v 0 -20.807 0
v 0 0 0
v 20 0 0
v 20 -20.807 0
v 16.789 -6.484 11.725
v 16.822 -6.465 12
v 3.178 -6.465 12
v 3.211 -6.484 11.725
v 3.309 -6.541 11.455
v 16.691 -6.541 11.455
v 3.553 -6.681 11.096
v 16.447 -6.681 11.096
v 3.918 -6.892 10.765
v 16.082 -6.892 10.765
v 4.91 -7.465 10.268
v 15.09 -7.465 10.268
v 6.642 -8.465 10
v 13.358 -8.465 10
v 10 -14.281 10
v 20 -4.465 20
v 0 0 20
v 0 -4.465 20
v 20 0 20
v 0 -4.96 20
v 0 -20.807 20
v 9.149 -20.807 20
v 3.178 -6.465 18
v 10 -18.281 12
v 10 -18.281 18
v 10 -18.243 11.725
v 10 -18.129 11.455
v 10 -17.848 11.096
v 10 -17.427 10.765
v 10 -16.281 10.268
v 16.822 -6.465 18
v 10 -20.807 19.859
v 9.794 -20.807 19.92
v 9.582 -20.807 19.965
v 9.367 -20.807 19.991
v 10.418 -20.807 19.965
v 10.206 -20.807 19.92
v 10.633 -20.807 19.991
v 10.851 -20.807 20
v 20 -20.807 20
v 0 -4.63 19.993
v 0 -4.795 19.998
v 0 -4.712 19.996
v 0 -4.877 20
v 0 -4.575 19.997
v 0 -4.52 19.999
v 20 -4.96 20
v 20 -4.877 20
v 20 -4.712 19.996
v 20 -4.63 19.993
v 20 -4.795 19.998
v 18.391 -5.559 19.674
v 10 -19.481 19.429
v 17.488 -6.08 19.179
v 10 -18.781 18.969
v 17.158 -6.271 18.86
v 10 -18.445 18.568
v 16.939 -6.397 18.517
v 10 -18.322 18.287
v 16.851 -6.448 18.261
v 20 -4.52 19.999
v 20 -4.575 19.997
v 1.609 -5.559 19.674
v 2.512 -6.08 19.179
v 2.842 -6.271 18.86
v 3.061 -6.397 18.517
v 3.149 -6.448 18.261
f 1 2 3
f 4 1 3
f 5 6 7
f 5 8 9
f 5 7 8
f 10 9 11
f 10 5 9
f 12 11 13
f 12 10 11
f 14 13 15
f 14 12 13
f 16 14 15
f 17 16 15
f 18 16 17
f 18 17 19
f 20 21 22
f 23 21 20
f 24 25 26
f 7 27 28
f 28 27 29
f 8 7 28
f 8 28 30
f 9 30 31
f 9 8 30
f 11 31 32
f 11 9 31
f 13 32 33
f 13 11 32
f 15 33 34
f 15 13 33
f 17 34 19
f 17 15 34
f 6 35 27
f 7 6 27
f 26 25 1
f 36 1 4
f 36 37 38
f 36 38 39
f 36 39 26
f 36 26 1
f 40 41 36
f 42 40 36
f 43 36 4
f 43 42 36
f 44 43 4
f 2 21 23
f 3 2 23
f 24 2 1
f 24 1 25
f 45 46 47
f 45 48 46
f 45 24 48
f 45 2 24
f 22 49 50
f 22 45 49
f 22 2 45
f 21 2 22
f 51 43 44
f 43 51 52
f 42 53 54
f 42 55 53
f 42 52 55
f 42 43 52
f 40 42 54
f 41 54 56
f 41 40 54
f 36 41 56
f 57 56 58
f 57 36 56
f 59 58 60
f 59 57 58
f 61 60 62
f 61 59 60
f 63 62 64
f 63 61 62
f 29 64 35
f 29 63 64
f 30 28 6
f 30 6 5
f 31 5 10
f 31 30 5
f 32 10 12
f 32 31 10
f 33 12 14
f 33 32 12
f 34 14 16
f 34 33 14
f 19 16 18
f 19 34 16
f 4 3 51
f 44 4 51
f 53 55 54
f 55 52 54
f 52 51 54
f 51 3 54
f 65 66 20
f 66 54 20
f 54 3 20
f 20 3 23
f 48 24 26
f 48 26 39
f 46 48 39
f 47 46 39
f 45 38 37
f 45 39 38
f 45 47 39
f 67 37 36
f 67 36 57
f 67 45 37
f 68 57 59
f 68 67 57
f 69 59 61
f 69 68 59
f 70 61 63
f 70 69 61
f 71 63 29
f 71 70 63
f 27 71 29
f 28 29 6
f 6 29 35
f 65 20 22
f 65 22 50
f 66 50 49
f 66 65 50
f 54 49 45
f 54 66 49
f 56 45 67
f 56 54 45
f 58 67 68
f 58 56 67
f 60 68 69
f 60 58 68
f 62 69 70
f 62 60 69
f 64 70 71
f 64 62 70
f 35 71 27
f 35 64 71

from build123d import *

# Parameters (mm, degrees)
F0_W         = 20
F0_H         = 20
F1_DEPTH     = 20.8070650697
F3_DEPTH     = 10
F4_T4_DEPTH  = 23.6433897602
F4_T10_DEPTH = 23.6433897602
F4_T15_DEPTH = 23.6433897602
F4_T20_DEPTH = 23.6433897602
F4_T26_DEPTH = 23.6433897602
F4_T32_DEPTH = 23.6433897602
F4_T39_DEPTH = 23.6433897602
F4_T44_DEPTH = 23.6433897602
F4_T52_DEPTH = 23.6433897602
F4_T57_DEPTH = 23.6433897602
F4_T65_DEPTH = 23.6433897602
F4_T70_DEPTH = 23.6433897602


# Not quite as in the source:
# - a fillet or chamfer that OpenCascade refuses, or shapes differently, is made with other operations: its cross-section is extruded or revolved along the edge and cut away or added


with BuildPart() as f1:
    # F0 (on Front) → F1 (new body)
    with BuildSketch(Plane.XZ):
        with Locations((10, 10)):
            Rectangle(F0_W, F0_H)
    extrude(amount=F1_DEPTH)

    # F2 (on face) → F3 (cut)
    with BuildSketch(Plane.XY.offset(20)):
        Polygon((10, -18.2805472855), (16.8216948801, -6.4650251595), (3.1783051199, -6.4650251595), align=None)
    extrude(amount=-F3_DEPTH, mode=Mode.SUBTRACT)

    # F4: fillet of radius 2 on 6 edges, made by hand


with BuildPart() as f4_tool2:
    # F4_s3 → F4_t4 (new body)
    with BuildSketch(Plane.YZ.offset(21.8216948801)):
        with BuildLine():
            ThreePointArc((-6.4650251595, 12), (-7.0508115971, 10.5857864376), (-8.4650251595, 10))
            Line((-8.4650251595, 10), (-6.4650251595, 10))
            Line((-6.4650251595, 10), (-6.4650251595, 12))
        make_face()
    extrude(amount=-F4_T4_DEPTH)

    split(bisect_by=Plane(origin=(-0.4157091722, -0.2400098025, 0), x_dir=(0, 0, 1), z_dir=(0.8660254038, 0.5, 0)), keep=Keep.TOP)

    split(bisect_by=Plane(origin=(15.4157091722, -8.9002638403, 0), x_dir=(0, 0, 1), z_dir=(-0.8660254038, 0.5, 0)), keep=Keep.TOP)


with BuildPart() as f1_1:
    add(f1.part)

    # F4_t1: union F4_tool2
    add(f4_tool2.part)


with BuildPart() as f4_tool8:
    # F4_s9 → F4_t10 (new body)
    with BuildSketch(Plane(origin=(-7.9157091722, -13.7104104641, 0), x_dir=(0, 0, 1), z_dir=(0.5, 0.8660254038, 0))):
        with BuildLine():
            ThreePointArc((12, 17.8005276806), (10.5857864376, 17.214741243), (10, 15.8005276806))
            Line((10, 15.8005276806), (10, 17.8005276806))
            Line((10, 17.8005276806), (12, 17.8005276806))
        make_face()
    extrude(amount=F4_T10_DEPTH)

    split(bisect_by=Plane(origin=(-0.4157091722, -0.2400098025, 0), x_dir=(0, 0, 1), z_dir=(0.8660254038, 0.5, 0)), keep=Keep.TOP)


with BuildPart() as f1_2:
    add(f1_1.part)

    # F4_t7: union F4_tool8
    add(f4_tool8.part)


with BuildPart() as f4_tool13:
    # F4_s14 → F4_t15 (new body)
    with BuildSketch(Plane(origin=(1.0940142921, -1.8948883381, 0), x_dir=(0, 0, 1), z_dir=(0.5, -0.8660254038, 0))):
        with BuildLine():
            ThreePointArc((12, 0.4800196049), (10.5857864376, -0.1057668327), (10, -1.5199803951))
            Line((10, -1.5199803951), (10, 0.4800196049))
            Line((10, 0.4800196049), (12, 0.4800196049))
        make_face()
    extrude(amount=F4_T15_DEPTH)

    split(bisect_by=Plane(origin=(15.4157091722, -8.9002638403, 0), x_dir=(0, 0, 1), z_dir=(-0.8660254038, 0.5, 0)), keep=Keep.TOP)


with BuildPart() as f1_3:
    add(f1_2.part)

    # F4_t12: union F4_tool13
    add(f4_tool13.part)


with BuildPart() as f4_tool18:
    # F4_s19 → F4_t20 (new body)
    with BuildSketch(Plane(origin=(-7.9157091722, -13.7104104641, 0), x_dir=(0, 0, 1), z_dir=(0.5, 0.8660254038, 0))):
        with BuildLine():
            ThreePointArc((20, 19.8005276806), (19.4142135624, 18.3863141182), (18, 17.8005276806))
            Line((18, 17.8005276806), (20, 17.8005276806))
            Line((20, 17.8005276806), (20, 19.8005276806))
        make_face()
    extrude(amount=F4_T20_DEPTH)

    split(bisect_by=Plane(origin=(-0.4157091722, -0.2400098025, 0), x_dir=(0, 0, 1), z_dir=(0.8660254038, 0.5, 0)), keep=Keep.TOP)

    split(bisect_by=Plane.XZ.offset(6.4650251595), keep=Keep.TOP)


with BuildPart() as f1_4:
    add(f1_3.part)

    # F4_t17: cut F4_tool18
    add(f4_tool18.part, mode=Mode.SUBTRACT)


with BuildPart() as f4_tool24:
    # F4_s25 → F4_t26 (new body)
    with BuildSketch(Plane(origin=(1.0940142921, -1.8948883381, 0), x_dir=(0, 0, 1), z_dir=(0.5, -0.8660254038, 0))):
        with BuildLine():
            ThreePointArc((20, 2.4800196049), (19.4142135624, 1.0658060425), (18, 0.4800196049))
            Line((18, 0.4800196049), (20, 0.4800196049))
            Line((20, 0.4800196049), (20, 2.4800196049))
        make_face()
    extrude(amount=F4_T26_DEPTH)

    split(bisect_by=Plane.XZ.offset(6.4650251595), keep=Keep.TOP)

    split(bisect_by=Plane(origin=(15.4157091722, -8.9002638403, 0), x_dir=(0, 0, 1), z_dir=(-0.8660254038, 0.5, 0)), keep=Keep.TOP)


with BuildPart() as f1_5:
    add(f1_4.part)

    # F4_t23: cut F4_tool24
    add(f4_tool24.part, mode=Mode.SUBTRACT)


with BuildPart() as f4_tool30:
    # F4_s31 → F4_t32 (new body)
    with BuildSketch(Plane.YZ.offset(21.8216948801)):
        with BuildLine():
            ThreePointArc((-4.4650251595, 20), (-5.8792387219, 19.4142135624), (-6.4650251595, 18))
            Line((-6.4650251595, 18), (-6.4650251595, 20))
            Line((-6.4650251595, 20), (-4.4650251595, 20))
        make_face()
    extrude(amount=-F4_T32_DEPTH)

    split(bisect_by=Plane(origin=(-0.4157091722, -0.2400098025, 0), x_dir=(0, 0, 1), z_dir=(0.8660254038, 0.5, 0)), keep=Keep.TOP)

    split(bisect_by=Plane(origin=(15.4157091722, -8.9002638403, 0), x_dir=(0, 0, 1), z_dir=(-0.8660254038, 0.5, 0)), keep=Keep.TOP)


with BuildPart() as f1_6:
    add(f1_5.part)

    # F4_t29: cut F4_tool30
    add(f4_tool30.part, mode=Mode.SUBTRACT)


with BuildPart() as f4_tool37:
    # F4_s38 → F4_t39 (new body)
    with BuildSketch(Plane(origin=(1.0940142921, -1.8948883381, 0), x_dir=(0, 0, 1), z_dir=(0.5, -0.8660254038, 0))):
        with BuildLine():
            ThreePointArc((20, 2.4800196049), (19.4142135624, 1.0658060425), (18, 0.4800196049))
            Line((18, 0.4800196049), (20, 0.4800196049))
            Line((20, 0.4800196049), (20, 2.4800196049))
        make_face()
    extrude(amount=F4_T39_DEPTH)

    split(bisect_by=Plane.XZ.offset(20.8070650697), keep=Keep.BOTTOM)

    split(bisect_by=Plane(origin=(15.4157091722, -8.9002638403, 0), x_dir=(0, 0, 1), z_dir=(0.8660254038, -0.5, 0)), keep=Keep.TOP)


with BuildPart() as f4_tool42:
    # F4_s43 → F4_t44 (new body)
    with BuildSketch(Plane(origin=(-7.9157091722, -13.7104104641, 0), x_dir=(0, 0, 1), z_dir=(0.5, 0.8660254038, 0))):
        with BuildLine():
            ThreePointArc((20, 19.8005276806), (19.4142135624, 18.3863141182), (18, 17.8005276806))
            Line((18, 17.8005276806), (20, 17.8005276806))
            Line((20, 17.8005276806), (20, 19.8005276806))
        make_face()
    extrude(amount=F4_T44_DEPTH)

    split(bisect_by=Plane.XZ.offset(20.8070650697), keep=Keep.BOTTOM)

    split(bisect_by=Plane(origin=(-0.4157091722, -0.2400098025, 0), x_dir=(0, 0, 1), z_dir=(-0.8660254038, -0.5, 0)), keep=Keep.TOP)


with BuildPart() as f4_tool37_1:
    add(f4_tool37.part)

    # F4_t47: intersect F4_tool42
    add(f4_tool42.part, mode=Mode.INTERSECT)


with BuildPart() as f1_7:
    add(f1_6.part)

    # F4_t35: cut F4_tool37
    add(f4_tool37_1.part, mode=Mode.SUBTRACT)


with BuildPart() as f4_tool50:
    # F4_s51 → F4_t52 (new body)
    with BuildSketch(Plane.YZ.offset(21.8216948801)):
        with BuildLine():
            ThreePointArc((-4.4650251595, 20), (-5.8792387219, 19.4142135624), (-6.4650251595, 18))
            Line((-6.4650251595, 18), (-6.4650251595, 20))
            Line((-6.4650251595, 20), (-4.4650251595, 20))
        make_face()
    extrude(amount=-F4_T52_DEPTH)

    split(bisect_by=Plane.YZ.offset(20), keep=Keep.BOTTOM)

    split(bisect_by=Plane(origin=(15.4157091722, -8.9002638403, 0), x_dir=(0, 0, 1), z_dir=(0.8660254038, -0.5, 0)), keep=Keep.TOP)


with BuildPart() as f4_tool55:
    # F4_s56 → F4_t57 (new body)
    with BuildSketch(Plane(origin=(-7.9157091722, -13.7104104641, 0), x_dir=(0, 0, 1), z_dir=(0.5, 0.8660254038, 0))):
        with BuildLine():
            ThreePointArc((20, 19.8005276806), (19.4142135624, 18.3863141182), (18, 17.8005276806))
            Line((18, 17.8005276806), (20, 17.8005276806))
            Line((20, 17.8005276806), (20, 19.8005276806))
        make_face()
    extrude(amount=F4_T57_DEPTH)

    split(bisect_by=Plane.YZ.offset(20), keep=Keep.BOTTOM)

    split(bisect_by=Plane.XZ.offset(6.4650251595), keep=Keep.BOTTOM)


with BuildPart() as f4_tool50_1:
    add(f4_tool50.part)

    # F4_t60: intersect F4_tool55
    add(f4_tool55.part, mode=Mode.INTERSECT)


with BuildPart() as f1_8:
    add(f1_7.part)

    # F4_t48: cut F4_tool50
    add(f4_tool50_1.part, mode=Mode.SUBTRACT)


with BuildPart() as f4_tool63:
    # F4_s64 → F4_t65 (new body)
    with BuildSketch(Plane(origin=(1.0940142921, -1.8948883381, 0), x_dir=(0, 0, 1), z_dir=(0.5, -0.8660254038, 0))):
        with BuildLine():
            ThreePointArc((20, 2.4800196049), (19.4142135624, 1.0658060425), (18, 0.4800196049))
            Line((18, 0.4800196049), (20, 0.4800196049))
            Line((20, 0.4800196049), (20, 2.4800196049))
        make_face()
    extrude(amount=F4_T65_DEPTH)

    split(bisect_by=Plane.YZ, keep=Keep.TOP)

    split(bisect_by=Plane.XZ.offset(6.4650251595), keep=Keep.BOTTOM)


with BuildPart() as f4_tool68:
    # F4_s69 → F4_t70 (new body)
    with BuildSketch(Plane.YZ.offset(21.8216948801)):
        with BuildLine():
            ThreePointArc((-4.4650251595, 20), (-5.8792387219, 19.4142135624), (-6.4650251595, 18))
            Line((-6.4650251595, 18), (-6.4650251595, 20))
            Line((-6.4650251595, 20), (-4.4650251595, 20))
        make_face()
    extrude(amount=-F4_T70_DEPTH)

    split(bisect_by=Plane.YZ, keep=Keep.TOP)

    split(bisect_by=Plane(origin=(-0.4157091722, -0.2400098025, 0), x_dir=(0, 0, 1), z_dir=(-0.8660254038, -0.5, 0)), keep=Keep.TOP)


with BuildPart() as f4_tool63_1:
    add(f4_tool63.part)

    # F4_t73: intersect F4_tool68
    add(f4_tool68.part, mode=Mode.INTERSECT)


with BuildPart() as f1_9:
    add(f1_8.part)

    # F4_t61: cut F4_tool63
    add(f4_tool63_1.part, mode=Mode.SUBTRACT)


solid = f1_9.part
